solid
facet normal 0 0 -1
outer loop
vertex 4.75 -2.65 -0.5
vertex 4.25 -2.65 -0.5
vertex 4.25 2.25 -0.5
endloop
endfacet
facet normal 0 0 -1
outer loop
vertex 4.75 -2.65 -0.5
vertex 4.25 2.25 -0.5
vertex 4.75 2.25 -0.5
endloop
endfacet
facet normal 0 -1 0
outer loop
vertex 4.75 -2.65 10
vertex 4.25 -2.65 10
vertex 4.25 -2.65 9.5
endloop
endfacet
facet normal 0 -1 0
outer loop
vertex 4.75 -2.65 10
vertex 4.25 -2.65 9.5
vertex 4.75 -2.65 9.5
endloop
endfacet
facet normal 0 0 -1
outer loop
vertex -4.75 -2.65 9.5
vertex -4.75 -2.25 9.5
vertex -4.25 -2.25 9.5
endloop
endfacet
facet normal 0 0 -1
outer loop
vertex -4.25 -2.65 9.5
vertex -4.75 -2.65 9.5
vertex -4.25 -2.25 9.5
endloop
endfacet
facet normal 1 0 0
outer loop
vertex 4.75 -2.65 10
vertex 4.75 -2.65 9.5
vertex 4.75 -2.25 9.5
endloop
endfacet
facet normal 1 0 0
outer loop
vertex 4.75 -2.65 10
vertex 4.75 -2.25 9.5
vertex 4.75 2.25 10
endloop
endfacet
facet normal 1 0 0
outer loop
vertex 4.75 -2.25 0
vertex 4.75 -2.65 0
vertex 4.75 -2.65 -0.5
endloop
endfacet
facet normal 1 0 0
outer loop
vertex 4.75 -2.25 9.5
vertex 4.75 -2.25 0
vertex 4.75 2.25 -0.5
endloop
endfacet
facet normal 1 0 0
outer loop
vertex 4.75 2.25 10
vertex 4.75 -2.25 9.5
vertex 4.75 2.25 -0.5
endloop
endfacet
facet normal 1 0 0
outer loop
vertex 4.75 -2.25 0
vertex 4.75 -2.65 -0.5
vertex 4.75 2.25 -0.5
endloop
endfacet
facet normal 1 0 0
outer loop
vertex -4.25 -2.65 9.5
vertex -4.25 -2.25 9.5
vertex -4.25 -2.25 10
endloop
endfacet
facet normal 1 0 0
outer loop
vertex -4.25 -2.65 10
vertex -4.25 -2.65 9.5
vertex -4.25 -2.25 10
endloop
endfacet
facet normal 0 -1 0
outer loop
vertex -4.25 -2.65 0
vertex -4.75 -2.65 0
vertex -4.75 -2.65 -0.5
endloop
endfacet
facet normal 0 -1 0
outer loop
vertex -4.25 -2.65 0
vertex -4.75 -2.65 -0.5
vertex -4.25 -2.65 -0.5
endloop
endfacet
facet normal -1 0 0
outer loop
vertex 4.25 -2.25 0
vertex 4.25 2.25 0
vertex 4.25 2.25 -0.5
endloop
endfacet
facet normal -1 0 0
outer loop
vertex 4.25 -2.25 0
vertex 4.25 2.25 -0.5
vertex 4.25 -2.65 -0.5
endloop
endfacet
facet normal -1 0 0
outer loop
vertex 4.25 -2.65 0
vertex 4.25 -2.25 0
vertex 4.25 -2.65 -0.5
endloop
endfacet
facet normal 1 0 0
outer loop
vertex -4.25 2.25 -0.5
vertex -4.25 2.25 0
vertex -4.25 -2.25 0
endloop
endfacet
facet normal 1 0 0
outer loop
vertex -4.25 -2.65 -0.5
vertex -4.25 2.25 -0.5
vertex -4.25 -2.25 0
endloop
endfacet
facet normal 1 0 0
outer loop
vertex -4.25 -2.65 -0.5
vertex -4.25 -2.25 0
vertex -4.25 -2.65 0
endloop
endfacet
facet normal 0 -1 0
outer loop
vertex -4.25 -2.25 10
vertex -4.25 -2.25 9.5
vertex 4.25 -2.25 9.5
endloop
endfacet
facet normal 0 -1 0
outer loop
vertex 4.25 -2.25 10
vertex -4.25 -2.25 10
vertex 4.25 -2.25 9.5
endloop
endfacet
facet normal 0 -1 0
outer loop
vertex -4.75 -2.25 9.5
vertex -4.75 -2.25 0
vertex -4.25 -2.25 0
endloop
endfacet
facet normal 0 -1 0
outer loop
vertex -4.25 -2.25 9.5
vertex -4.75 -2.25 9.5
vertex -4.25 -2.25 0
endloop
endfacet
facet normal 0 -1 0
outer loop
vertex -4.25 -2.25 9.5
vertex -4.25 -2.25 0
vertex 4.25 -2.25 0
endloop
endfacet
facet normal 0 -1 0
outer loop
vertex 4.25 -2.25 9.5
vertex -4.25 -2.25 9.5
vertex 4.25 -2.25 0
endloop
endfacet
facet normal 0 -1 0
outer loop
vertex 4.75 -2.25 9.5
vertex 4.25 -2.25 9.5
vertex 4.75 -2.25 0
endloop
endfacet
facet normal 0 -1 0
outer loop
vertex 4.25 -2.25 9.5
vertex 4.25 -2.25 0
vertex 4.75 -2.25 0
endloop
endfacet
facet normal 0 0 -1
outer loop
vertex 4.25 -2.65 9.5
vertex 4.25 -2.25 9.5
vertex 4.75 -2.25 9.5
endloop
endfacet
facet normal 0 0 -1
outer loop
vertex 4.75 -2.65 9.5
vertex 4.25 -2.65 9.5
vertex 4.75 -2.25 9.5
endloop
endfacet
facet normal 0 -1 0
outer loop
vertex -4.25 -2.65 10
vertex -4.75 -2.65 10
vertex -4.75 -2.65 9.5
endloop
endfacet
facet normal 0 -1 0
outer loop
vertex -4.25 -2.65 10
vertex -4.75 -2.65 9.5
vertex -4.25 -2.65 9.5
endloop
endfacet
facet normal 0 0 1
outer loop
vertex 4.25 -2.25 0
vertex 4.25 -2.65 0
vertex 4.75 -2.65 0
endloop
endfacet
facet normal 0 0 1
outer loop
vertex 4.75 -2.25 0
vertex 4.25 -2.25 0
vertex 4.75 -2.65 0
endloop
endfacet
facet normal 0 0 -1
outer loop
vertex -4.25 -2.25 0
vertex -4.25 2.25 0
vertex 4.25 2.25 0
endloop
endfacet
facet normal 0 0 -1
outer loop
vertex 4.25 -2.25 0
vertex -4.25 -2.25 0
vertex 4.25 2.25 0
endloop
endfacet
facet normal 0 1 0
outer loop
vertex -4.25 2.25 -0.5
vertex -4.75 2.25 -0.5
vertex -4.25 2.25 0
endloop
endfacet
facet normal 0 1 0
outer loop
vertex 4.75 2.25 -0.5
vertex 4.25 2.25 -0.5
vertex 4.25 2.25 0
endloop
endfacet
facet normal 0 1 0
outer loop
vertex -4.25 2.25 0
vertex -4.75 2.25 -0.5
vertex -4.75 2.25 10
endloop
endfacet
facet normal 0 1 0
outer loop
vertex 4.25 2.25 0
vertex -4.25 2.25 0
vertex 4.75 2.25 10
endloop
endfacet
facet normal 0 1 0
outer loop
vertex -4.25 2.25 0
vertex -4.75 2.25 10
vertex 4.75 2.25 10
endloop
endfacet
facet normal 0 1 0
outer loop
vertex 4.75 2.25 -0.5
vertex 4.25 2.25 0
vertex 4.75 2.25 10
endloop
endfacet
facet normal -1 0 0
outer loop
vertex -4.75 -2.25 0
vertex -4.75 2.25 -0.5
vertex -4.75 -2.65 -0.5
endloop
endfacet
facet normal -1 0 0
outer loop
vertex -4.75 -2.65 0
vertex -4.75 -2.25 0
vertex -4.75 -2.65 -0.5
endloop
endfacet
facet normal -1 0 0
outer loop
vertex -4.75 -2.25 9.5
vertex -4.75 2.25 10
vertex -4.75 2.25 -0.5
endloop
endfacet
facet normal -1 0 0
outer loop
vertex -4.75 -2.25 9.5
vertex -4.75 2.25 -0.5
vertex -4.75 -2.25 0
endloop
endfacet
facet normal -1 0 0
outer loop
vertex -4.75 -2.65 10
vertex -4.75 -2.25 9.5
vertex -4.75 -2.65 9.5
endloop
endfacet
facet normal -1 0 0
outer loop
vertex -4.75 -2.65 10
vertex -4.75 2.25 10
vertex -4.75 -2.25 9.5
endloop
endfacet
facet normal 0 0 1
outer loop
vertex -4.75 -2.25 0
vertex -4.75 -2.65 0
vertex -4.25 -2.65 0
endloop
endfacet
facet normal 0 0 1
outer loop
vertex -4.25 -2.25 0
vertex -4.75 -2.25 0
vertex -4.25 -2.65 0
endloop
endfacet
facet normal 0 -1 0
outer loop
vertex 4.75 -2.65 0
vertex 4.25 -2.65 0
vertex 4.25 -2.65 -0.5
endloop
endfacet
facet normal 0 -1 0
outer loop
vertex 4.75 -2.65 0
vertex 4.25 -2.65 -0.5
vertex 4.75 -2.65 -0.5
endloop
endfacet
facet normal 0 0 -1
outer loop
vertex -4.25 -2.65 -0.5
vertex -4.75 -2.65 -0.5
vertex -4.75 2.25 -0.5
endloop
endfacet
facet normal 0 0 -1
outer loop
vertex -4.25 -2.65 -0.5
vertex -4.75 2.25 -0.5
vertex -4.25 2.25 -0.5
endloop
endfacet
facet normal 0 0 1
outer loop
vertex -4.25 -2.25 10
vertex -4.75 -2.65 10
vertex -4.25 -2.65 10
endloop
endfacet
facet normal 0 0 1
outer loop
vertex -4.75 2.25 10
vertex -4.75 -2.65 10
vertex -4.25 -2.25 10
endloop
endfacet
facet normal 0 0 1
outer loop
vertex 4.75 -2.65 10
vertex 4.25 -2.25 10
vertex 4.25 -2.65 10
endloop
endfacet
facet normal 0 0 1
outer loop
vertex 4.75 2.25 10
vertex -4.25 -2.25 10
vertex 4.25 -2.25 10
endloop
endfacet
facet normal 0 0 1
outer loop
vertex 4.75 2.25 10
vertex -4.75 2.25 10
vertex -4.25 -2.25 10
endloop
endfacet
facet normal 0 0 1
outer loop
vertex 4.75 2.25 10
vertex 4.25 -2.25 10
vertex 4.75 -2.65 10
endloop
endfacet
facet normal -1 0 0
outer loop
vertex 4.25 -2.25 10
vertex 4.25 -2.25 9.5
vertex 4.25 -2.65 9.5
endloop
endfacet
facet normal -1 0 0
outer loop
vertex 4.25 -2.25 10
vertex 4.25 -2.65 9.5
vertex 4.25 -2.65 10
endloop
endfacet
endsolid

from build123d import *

# Parameters (mm, degrees)
SKETCH015_W  = 9.5
SKETCH015_H  = 4.5
PAD007_DEPTH = 10
SKETCH014_W  = 0.5
SKETCH014_H  = 0.5
PAD008_DEPTH = 0.4
SKETCH017_W  = 0.5
SKETCH017_H  = 4.9
PAD010_DEPTH = 0.5


with BuildPart() as part:
    # Sketch015 → Pad007 (new body)
    with BuildSketch(Plane.XY):
        Rectangle(SKETCH015_W, SKETCH015_H)
    extrude(amount=PAD007_DEPTH)

    # Sketch014 (on Face3 of Pad007) → Pad008 (join)
    with BuildSketch(Plane.XZ.offset(2.25)):
        with Locations((-4.5, 9.75)):
            Rectangle(SKETCH014_W, SKETCH014_H)
        with Locations((4.5, 9.75)):
            Rectangle(SKETCH014_W, SKETCH014_H)
    extrude(amount=PAD008_DEPTH)

    # Sketch017 (on Face4 of Pad008) → Pad010 (join)
    with BuildSketch(Plane(origin=(0, 0, 0), x_dir=(1, 0, 0), z_dir=(0, 0, -1))):
        with Locations((-4.5, 0.2)):
            Rectangle(SKETCH017_W, SKETCH017_H)
        with Locations((4.5, 0.2)):
            Rectangle(SKETCH017_W, SKETCH017_H)
    extrude(amount=PAD010_DEPTH)


solid = part.part
